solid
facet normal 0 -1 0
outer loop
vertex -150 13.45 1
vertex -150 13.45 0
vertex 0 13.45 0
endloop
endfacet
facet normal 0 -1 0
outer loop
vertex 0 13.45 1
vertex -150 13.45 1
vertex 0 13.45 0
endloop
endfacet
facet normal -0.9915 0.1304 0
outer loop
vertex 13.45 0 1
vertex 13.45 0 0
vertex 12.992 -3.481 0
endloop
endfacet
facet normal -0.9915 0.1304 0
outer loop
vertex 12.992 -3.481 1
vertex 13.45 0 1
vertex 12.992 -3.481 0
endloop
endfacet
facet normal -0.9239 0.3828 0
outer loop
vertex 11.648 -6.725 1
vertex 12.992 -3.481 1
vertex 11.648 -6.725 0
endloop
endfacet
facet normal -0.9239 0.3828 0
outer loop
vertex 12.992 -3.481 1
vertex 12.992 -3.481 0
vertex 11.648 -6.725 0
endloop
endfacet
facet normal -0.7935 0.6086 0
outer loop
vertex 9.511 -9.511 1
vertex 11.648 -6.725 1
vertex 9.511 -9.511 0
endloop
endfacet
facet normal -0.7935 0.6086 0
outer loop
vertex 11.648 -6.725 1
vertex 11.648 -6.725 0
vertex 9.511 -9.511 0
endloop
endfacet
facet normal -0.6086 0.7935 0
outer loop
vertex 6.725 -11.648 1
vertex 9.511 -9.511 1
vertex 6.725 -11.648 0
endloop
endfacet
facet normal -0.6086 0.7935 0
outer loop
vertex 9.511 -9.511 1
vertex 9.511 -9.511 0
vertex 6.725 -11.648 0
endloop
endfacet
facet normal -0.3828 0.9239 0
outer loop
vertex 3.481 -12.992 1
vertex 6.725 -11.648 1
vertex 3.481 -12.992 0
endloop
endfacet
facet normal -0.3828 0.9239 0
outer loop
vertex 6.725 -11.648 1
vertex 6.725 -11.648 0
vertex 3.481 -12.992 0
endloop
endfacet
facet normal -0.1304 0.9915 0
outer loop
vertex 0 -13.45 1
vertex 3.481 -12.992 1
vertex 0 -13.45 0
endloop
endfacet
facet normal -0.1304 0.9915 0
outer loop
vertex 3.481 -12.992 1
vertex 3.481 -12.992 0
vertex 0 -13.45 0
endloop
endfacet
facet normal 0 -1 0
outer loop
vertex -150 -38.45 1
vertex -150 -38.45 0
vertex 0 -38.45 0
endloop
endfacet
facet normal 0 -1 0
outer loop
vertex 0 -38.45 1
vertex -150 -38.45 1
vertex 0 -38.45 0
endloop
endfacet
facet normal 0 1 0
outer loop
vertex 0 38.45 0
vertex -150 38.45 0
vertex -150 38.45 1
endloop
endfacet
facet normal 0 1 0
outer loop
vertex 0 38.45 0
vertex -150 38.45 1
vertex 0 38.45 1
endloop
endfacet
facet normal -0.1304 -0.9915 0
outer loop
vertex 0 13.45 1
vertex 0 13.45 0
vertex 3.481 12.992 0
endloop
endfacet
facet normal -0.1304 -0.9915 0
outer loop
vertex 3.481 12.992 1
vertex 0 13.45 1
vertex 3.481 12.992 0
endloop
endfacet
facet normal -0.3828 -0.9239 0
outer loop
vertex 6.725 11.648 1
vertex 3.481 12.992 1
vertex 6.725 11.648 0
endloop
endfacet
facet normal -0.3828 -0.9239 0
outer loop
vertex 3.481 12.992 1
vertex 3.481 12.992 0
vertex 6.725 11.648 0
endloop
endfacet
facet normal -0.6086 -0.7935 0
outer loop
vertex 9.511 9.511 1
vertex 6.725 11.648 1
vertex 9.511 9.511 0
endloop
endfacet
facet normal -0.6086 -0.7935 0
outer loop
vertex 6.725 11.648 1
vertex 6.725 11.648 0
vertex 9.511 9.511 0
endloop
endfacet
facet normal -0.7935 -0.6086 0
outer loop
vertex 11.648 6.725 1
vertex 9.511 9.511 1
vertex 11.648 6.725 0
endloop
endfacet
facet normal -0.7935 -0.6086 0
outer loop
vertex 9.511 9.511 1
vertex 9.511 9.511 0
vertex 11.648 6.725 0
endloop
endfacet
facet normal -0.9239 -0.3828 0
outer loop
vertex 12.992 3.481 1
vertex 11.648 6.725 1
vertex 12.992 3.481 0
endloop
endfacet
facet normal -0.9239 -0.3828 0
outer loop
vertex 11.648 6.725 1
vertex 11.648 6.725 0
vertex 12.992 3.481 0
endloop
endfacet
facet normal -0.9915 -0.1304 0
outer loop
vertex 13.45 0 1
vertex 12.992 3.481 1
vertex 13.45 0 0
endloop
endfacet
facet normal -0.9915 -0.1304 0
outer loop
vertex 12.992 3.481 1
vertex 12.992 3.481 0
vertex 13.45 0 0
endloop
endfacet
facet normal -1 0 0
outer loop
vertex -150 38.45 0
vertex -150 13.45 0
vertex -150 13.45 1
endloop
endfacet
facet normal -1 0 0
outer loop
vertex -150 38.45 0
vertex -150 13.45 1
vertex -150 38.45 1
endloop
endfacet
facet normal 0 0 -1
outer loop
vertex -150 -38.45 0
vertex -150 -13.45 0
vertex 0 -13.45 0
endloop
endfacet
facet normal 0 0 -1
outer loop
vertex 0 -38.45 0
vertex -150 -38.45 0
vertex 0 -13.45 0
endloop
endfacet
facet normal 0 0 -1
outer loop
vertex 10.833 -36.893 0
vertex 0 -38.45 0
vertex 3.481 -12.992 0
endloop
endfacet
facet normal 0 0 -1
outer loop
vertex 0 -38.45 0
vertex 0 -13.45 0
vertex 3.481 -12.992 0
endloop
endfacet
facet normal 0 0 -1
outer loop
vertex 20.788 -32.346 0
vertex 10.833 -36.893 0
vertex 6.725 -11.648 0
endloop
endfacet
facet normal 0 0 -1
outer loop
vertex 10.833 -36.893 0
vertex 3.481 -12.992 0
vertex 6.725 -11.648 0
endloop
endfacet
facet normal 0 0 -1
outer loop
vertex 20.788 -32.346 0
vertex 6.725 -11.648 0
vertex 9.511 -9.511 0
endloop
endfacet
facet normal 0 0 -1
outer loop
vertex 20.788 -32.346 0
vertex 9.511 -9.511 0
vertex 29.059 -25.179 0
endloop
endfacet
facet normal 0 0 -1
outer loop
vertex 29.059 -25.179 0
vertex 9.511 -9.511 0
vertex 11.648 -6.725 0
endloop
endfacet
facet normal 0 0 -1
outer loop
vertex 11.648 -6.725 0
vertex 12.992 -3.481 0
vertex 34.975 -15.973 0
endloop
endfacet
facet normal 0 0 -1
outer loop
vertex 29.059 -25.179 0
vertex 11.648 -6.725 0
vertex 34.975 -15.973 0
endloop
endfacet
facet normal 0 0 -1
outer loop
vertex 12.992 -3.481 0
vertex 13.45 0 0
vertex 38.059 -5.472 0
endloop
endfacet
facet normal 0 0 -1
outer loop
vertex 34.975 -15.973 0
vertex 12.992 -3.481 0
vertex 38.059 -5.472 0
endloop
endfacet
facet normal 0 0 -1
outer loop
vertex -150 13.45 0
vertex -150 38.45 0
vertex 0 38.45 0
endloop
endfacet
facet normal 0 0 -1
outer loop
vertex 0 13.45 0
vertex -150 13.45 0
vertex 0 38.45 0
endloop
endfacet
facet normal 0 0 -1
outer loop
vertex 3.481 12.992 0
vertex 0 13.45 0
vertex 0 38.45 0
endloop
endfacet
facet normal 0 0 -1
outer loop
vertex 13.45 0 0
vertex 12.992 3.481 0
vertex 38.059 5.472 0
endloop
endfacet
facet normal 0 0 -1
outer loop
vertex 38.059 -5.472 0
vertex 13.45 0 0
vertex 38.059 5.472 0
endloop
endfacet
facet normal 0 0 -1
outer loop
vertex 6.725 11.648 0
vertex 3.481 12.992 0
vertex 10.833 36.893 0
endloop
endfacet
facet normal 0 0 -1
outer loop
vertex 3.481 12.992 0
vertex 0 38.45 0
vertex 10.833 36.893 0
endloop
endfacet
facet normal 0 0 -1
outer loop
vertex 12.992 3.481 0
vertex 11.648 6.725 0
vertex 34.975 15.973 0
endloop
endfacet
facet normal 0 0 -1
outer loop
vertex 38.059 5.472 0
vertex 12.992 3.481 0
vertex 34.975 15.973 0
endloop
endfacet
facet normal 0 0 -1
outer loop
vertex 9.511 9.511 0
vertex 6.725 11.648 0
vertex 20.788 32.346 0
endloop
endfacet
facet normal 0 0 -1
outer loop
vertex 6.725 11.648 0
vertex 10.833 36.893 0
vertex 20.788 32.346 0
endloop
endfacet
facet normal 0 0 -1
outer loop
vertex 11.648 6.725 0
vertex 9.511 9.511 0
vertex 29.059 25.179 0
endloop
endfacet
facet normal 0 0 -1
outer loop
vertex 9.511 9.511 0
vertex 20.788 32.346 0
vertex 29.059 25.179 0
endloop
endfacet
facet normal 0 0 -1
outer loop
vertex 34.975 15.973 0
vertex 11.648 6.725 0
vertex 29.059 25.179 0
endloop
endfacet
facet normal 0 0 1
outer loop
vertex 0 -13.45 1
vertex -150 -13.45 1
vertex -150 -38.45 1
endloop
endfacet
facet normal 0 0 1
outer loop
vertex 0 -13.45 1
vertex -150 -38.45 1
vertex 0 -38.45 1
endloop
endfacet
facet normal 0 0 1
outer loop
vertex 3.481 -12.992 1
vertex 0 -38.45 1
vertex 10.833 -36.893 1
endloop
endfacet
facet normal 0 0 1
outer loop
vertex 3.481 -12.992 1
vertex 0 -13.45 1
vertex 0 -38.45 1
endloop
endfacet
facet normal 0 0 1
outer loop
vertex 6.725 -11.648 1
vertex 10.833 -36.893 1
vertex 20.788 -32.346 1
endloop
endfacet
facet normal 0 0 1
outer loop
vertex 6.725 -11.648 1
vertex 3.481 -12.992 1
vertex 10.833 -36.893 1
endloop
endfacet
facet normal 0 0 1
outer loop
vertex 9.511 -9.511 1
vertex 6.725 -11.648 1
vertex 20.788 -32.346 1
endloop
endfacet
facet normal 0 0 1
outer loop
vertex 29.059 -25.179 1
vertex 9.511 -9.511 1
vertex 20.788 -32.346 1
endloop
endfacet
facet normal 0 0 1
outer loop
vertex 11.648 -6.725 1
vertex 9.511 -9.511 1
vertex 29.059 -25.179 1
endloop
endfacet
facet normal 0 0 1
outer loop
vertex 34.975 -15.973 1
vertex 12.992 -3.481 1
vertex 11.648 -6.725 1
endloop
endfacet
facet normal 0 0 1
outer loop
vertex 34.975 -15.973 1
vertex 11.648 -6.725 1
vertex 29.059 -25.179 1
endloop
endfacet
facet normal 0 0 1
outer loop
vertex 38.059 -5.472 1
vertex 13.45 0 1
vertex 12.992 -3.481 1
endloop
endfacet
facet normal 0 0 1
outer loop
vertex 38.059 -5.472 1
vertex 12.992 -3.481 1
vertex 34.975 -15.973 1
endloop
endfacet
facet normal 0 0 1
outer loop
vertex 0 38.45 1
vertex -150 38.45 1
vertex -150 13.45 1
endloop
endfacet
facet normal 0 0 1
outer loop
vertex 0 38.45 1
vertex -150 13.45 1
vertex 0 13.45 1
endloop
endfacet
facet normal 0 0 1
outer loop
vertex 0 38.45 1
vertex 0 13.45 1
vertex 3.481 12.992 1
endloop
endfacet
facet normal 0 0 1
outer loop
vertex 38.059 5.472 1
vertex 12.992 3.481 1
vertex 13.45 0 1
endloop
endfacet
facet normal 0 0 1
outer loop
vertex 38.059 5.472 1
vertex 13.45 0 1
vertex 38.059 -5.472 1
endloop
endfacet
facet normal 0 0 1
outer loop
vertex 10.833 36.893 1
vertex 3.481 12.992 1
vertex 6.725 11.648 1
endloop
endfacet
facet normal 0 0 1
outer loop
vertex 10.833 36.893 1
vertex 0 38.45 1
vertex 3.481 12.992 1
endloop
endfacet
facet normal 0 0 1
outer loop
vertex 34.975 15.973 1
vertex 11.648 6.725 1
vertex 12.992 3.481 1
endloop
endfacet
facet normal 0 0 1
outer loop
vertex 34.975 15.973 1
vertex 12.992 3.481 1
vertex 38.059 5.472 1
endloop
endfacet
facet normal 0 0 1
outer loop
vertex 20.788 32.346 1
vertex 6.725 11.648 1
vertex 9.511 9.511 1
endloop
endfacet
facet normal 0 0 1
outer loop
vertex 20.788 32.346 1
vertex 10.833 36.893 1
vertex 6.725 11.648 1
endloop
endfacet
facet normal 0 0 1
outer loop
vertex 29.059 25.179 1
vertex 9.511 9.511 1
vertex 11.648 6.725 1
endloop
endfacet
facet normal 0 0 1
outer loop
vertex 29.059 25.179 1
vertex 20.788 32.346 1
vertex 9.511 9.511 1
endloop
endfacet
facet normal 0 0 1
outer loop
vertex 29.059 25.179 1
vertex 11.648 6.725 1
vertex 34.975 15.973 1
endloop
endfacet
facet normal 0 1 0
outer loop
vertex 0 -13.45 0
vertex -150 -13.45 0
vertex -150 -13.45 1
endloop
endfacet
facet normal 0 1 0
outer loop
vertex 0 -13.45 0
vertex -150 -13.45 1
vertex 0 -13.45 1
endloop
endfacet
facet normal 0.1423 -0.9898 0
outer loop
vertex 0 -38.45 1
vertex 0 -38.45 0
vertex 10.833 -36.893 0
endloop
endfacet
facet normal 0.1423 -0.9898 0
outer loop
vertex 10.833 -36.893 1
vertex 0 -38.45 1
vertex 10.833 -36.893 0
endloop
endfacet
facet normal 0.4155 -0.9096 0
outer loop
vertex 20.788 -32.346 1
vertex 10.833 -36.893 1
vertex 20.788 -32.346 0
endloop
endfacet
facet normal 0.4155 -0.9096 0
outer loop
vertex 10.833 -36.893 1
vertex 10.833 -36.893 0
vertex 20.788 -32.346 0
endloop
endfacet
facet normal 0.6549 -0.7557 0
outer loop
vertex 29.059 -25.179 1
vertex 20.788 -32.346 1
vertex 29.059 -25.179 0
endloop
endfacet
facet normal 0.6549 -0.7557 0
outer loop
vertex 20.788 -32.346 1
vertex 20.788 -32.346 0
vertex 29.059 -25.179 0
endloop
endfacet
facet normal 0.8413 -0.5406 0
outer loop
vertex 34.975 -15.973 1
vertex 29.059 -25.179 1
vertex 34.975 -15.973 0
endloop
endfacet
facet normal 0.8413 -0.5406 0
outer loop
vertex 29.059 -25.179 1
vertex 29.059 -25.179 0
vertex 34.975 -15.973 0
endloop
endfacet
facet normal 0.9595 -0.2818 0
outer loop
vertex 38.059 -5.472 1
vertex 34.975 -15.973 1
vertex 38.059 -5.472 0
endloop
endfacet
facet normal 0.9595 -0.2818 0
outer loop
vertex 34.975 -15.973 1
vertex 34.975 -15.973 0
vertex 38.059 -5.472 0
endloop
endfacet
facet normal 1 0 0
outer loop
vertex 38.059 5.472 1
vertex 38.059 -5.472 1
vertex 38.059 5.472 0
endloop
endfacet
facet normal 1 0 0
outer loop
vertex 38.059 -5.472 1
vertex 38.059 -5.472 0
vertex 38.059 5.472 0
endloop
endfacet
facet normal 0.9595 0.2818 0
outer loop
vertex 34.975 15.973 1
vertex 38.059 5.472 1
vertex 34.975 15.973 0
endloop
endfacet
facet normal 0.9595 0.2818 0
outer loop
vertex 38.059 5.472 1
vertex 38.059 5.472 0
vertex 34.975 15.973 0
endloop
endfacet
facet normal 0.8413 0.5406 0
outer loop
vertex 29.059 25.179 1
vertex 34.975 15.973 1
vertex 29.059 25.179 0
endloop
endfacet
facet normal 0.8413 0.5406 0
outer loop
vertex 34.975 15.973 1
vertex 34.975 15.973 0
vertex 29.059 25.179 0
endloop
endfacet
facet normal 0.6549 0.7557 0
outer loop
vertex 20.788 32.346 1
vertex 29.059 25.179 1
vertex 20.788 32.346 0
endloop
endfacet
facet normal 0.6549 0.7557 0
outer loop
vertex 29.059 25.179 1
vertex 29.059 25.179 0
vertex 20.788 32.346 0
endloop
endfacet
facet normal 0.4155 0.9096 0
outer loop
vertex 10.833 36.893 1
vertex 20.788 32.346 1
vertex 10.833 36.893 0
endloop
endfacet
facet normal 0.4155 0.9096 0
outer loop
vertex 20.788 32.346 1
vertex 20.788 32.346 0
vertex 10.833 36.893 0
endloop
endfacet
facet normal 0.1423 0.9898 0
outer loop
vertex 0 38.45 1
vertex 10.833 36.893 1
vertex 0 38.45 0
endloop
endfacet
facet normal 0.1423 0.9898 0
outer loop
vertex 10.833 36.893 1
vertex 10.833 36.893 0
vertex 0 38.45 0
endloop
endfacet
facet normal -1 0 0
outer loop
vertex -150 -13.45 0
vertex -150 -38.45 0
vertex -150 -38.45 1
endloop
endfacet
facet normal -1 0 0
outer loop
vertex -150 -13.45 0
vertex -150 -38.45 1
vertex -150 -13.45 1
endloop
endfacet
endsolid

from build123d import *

# Parameters (mm, degrees)
F0_W     = 150
F0_H     = 25
F1_DEPTH = 1


with BuildPart() as f1:
    # F0 (on Top) → F1 (new body)
    with BuildSketch(Plane.XY):
        with Locations((-75, 25.95)):
            Rectangle(F0_W, F0_H)
        with BuildLine():
            ThreePointArc((0, 13.45), (9.510586, 9.510586), (13.45, 0))
            ThreePointArc((13.45, 0), (9.510586, -9.510586), (0, -13.45))
            Line((0, -13.45), (0, -38.45))
            ThreePointArc((0, -38.45), (38.45, 0), (0, 38.45))
            Line((0, 38.45), (0, 13.45))
        make_face()
        with Locations((-75, -25.95)):
            Rectangle(F0_W, F0_H)
    extrude(amount=F1_DEPTH)


solid = f1.part
